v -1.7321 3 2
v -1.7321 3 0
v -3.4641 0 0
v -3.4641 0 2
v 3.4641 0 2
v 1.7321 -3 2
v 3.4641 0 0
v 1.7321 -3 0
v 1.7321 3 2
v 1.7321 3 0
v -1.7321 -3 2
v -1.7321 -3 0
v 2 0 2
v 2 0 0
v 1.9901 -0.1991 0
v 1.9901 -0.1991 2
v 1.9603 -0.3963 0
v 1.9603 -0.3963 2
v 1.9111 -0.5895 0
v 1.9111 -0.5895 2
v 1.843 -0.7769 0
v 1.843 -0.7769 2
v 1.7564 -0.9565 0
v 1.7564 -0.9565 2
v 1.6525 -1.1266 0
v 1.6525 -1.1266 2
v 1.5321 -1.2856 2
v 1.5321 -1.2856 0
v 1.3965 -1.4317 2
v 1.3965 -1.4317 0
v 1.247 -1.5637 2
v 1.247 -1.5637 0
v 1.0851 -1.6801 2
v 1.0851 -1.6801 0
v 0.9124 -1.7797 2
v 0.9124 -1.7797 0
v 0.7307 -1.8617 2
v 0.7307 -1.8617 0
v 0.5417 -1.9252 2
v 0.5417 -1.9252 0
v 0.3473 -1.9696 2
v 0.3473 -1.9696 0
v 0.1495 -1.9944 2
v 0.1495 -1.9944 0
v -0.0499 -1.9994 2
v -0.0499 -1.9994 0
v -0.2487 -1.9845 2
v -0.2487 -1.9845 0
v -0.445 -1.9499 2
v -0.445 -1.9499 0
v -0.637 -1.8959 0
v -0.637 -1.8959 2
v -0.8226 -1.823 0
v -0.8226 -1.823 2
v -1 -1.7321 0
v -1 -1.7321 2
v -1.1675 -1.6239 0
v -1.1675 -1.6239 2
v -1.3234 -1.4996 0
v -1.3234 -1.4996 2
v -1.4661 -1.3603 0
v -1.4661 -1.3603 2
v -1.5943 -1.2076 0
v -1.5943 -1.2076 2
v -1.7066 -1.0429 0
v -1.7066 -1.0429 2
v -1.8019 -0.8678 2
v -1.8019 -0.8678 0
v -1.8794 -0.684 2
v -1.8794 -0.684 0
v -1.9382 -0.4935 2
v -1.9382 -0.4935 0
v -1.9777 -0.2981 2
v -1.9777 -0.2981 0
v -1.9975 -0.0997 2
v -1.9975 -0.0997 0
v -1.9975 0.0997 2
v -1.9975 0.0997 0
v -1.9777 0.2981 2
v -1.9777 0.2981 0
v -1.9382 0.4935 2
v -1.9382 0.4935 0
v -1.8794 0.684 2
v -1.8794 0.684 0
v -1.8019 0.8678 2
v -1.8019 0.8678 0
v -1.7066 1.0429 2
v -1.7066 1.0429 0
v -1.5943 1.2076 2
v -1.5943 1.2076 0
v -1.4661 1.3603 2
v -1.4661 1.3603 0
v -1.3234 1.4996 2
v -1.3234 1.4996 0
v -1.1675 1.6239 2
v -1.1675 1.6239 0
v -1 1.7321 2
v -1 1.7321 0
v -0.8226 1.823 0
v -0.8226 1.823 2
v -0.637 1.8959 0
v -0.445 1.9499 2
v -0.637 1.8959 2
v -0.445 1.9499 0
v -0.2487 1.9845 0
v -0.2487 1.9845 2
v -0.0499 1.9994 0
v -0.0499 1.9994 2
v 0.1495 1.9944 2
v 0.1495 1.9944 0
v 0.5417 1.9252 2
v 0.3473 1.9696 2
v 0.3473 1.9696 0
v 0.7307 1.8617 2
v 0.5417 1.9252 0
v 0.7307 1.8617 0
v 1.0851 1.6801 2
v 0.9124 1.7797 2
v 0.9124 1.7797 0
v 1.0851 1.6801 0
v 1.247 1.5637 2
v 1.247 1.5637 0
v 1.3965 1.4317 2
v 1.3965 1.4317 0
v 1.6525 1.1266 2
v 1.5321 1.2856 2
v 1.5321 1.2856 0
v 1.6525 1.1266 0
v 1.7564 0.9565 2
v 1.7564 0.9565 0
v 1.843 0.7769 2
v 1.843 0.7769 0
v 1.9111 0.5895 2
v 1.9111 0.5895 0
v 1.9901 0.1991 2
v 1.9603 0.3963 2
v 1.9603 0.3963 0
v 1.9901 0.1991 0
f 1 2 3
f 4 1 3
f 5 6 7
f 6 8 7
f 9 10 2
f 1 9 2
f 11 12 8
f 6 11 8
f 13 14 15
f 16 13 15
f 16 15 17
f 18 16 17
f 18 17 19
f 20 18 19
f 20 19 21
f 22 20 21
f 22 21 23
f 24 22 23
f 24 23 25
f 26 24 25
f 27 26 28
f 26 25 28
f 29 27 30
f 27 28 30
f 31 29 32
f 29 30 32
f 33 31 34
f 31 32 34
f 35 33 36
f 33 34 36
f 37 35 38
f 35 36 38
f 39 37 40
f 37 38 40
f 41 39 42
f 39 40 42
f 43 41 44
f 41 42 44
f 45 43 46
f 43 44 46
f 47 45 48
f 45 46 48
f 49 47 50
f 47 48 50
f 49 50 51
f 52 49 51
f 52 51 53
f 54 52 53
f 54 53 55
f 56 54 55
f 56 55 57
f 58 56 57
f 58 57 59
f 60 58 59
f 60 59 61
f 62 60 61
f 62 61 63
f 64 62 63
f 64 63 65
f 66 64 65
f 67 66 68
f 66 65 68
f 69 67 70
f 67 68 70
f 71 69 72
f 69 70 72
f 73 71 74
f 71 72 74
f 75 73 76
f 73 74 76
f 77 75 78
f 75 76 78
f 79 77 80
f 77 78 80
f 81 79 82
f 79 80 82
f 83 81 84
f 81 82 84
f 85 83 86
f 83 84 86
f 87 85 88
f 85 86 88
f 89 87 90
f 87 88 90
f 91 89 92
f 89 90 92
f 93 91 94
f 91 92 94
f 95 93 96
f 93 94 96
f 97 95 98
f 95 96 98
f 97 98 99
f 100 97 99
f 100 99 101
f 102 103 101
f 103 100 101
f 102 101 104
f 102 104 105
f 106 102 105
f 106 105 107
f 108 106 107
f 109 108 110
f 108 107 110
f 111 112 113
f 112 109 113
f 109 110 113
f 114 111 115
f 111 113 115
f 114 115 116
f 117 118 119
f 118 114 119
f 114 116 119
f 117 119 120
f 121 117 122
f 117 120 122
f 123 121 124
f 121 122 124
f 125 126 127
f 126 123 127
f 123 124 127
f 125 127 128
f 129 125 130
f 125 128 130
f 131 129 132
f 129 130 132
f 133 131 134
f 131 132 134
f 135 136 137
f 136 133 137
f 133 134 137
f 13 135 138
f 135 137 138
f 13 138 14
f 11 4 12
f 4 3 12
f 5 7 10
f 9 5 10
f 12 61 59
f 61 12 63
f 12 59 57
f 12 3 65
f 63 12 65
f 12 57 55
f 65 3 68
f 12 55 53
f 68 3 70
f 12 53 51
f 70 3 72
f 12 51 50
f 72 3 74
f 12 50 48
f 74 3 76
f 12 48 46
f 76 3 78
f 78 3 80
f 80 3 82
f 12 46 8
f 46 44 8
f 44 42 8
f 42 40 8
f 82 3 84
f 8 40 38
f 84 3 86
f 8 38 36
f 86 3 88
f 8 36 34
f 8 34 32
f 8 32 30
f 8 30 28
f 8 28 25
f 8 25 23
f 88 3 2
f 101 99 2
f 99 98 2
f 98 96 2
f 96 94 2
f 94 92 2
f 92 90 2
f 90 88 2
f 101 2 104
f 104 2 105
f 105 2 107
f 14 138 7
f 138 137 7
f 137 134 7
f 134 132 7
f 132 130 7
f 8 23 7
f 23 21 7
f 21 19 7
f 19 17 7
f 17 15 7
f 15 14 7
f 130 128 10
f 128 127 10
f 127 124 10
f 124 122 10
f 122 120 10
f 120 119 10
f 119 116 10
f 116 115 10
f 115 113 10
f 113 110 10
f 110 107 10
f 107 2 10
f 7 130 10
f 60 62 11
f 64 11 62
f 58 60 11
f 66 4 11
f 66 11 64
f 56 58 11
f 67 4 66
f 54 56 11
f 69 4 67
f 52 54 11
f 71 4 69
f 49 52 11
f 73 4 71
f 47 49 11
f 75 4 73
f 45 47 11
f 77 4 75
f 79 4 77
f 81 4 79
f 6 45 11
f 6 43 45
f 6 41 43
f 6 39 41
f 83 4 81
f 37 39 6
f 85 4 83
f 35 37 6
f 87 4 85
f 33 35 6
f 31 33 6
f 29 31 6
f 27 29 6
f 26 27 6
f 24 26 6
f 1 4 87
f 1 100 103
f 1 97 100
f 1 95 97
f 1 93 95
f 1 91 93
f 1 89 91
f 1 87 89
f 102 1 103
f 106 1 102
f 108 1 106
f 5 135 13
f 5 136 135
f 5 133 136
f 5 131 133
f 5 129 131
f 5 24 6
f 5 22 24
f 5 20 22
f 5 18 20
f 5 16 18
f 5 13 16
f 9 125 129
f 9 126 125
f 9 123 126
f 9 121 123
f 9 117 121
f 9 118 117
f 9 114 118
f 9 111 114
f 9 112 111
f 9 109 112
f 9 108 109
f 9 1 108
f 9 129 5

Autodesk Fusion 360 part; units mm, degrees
sketch "Boceto1" plane through (0, 0, 0) normal (0, 0, 1) x (1, 0, 0)
  circle A0 centre (0, 0) radius 2
  line L0 (-1.7321, 3) -> (-3.4641, 0)
  line L1 (-3.4641, 0) -> (-1.7321, -3)
  line L2 (-1.7321, -3) -> (1.7321, -3)
  line L3 (1.7321, -3) -> (3.4641, 0)
  line L4 (3.4641, 0) -> (1.7321, 3)
  line L5 (1.7321, 3) -> (-1.7321, 3)
  dimension "d1" = 4
extrude "Extruir1" add sketch "Boceto1" along normal blind 2
